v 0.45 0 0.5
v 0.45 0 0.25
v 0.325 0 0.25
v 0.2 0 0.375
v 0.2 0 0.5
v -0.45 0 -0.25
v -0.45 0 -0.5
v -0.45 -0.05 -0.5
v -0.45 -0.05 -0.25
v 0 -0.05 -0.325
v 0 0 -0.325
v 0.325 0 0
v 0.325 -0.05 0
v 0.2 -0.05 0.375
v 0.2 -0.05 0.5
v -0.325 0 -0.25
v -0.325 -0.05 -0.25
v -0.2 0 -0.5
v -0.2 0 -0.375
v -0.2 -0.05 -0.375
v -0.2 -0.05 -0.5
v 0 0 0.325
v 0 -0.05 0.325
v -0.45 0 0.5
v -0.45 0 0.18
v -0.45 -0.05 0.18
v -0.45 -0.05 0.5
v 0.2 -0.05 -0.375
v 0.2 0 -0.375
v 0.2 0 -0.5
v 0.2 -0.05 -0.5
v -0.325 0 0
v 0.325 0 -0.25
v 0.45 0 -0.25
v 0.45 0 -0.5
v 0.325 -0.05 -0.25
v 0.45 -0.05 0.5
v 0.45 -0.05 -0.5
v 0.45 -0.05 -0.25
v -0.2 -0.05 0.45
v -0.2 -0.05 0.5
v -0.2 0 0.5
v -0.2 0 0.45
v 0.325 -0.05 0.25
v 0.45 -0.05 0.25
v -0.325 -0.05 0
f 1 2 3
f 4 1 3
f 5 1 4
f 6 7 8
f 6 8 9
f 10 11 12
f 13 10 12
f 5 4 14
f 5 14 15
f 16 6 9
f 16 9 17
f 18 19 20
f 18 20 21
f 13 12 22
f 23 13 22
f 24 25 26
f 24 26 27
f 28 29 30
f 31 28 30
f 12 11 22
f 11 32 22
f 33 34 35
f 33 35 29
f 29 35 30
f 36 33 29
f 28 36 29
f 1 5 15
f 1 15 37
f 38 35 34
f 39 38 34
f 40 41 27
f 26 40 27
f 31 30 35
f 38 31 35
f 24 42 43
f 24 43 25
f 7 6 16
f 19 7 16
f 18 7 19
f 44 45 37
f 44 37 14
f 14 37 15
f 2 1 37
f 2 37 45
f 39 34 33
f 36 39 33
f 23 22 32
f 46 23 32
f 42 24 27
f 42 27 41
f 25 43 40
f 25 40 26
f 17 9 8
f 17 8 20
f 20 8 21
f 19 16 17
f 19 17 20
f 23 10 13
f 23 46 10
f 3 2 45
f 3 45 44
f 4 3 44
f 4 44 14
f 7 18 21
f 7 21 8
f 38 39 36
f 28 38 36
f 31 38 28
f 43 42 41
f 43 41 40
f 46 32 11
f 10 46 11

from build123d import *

# Parameters (mm, degrees)
SALIENTE_EXTRUIR1_DEPTH = 0.05
SALIENTE_EXTRUIR2_DEPTH = 0.05
MATRIZC5_COUNT          = 2
SALIENTE_EXTRUIR3_DEPTH = 0.05


with BuildPart() as part:
    # Croquis1 → Saliente-Extruir1 (new body)
    with BuildSketch(Plane.XZ):
        Polygon((0, -0.325), (0.325, 0), (0, 0.325), (-0.325, 0), align=None)
    extrude(amount=SALIENTE_EXTRUIR1_DEPTH)


with BuildPart() as body_2:
    # Croquis2 → Saliente-Extruir2 (new body)
    with BuildSketch(Plane.XZ):
        Polygon((0.2, 0.5), (0.45, 0.5), (0.45, 0.250000001), (0.325, 0.250000001), (0.2, 0.375000001), align=None)
    extrude(amount=SALIENTE_EXTRUIR2_DEPTH)


with BuildPart() as matrizc5_1:
    # MatrizC5: pattern copy
    add(body_2.part.rotate(Axis((0, 0, 0), (0, 1, 0)), 1 * 360 / MATRIZC5_COUNT))


with BuildPart() as body_4:
    # Simetría1: mirrored copy
    add(body_2.part.mirror(Plane.XY))


with BuildPart() as body_5:
    # Croquis3 → Saliente-Extruir3 (new body)
    with BuildSketch(Plane.XZ):
        Polygon((-0.45, 0.5), (-0.2, 0.5), (-0.2, 0.45), (-0.45, 0.18), align=None)
    extrude(amount=SALIENTE_EXTRUIR3_DEPTH)


solid = Compound([part.part, body_2.part, matrizc5_1.part, body_4.part, body_5.part])
